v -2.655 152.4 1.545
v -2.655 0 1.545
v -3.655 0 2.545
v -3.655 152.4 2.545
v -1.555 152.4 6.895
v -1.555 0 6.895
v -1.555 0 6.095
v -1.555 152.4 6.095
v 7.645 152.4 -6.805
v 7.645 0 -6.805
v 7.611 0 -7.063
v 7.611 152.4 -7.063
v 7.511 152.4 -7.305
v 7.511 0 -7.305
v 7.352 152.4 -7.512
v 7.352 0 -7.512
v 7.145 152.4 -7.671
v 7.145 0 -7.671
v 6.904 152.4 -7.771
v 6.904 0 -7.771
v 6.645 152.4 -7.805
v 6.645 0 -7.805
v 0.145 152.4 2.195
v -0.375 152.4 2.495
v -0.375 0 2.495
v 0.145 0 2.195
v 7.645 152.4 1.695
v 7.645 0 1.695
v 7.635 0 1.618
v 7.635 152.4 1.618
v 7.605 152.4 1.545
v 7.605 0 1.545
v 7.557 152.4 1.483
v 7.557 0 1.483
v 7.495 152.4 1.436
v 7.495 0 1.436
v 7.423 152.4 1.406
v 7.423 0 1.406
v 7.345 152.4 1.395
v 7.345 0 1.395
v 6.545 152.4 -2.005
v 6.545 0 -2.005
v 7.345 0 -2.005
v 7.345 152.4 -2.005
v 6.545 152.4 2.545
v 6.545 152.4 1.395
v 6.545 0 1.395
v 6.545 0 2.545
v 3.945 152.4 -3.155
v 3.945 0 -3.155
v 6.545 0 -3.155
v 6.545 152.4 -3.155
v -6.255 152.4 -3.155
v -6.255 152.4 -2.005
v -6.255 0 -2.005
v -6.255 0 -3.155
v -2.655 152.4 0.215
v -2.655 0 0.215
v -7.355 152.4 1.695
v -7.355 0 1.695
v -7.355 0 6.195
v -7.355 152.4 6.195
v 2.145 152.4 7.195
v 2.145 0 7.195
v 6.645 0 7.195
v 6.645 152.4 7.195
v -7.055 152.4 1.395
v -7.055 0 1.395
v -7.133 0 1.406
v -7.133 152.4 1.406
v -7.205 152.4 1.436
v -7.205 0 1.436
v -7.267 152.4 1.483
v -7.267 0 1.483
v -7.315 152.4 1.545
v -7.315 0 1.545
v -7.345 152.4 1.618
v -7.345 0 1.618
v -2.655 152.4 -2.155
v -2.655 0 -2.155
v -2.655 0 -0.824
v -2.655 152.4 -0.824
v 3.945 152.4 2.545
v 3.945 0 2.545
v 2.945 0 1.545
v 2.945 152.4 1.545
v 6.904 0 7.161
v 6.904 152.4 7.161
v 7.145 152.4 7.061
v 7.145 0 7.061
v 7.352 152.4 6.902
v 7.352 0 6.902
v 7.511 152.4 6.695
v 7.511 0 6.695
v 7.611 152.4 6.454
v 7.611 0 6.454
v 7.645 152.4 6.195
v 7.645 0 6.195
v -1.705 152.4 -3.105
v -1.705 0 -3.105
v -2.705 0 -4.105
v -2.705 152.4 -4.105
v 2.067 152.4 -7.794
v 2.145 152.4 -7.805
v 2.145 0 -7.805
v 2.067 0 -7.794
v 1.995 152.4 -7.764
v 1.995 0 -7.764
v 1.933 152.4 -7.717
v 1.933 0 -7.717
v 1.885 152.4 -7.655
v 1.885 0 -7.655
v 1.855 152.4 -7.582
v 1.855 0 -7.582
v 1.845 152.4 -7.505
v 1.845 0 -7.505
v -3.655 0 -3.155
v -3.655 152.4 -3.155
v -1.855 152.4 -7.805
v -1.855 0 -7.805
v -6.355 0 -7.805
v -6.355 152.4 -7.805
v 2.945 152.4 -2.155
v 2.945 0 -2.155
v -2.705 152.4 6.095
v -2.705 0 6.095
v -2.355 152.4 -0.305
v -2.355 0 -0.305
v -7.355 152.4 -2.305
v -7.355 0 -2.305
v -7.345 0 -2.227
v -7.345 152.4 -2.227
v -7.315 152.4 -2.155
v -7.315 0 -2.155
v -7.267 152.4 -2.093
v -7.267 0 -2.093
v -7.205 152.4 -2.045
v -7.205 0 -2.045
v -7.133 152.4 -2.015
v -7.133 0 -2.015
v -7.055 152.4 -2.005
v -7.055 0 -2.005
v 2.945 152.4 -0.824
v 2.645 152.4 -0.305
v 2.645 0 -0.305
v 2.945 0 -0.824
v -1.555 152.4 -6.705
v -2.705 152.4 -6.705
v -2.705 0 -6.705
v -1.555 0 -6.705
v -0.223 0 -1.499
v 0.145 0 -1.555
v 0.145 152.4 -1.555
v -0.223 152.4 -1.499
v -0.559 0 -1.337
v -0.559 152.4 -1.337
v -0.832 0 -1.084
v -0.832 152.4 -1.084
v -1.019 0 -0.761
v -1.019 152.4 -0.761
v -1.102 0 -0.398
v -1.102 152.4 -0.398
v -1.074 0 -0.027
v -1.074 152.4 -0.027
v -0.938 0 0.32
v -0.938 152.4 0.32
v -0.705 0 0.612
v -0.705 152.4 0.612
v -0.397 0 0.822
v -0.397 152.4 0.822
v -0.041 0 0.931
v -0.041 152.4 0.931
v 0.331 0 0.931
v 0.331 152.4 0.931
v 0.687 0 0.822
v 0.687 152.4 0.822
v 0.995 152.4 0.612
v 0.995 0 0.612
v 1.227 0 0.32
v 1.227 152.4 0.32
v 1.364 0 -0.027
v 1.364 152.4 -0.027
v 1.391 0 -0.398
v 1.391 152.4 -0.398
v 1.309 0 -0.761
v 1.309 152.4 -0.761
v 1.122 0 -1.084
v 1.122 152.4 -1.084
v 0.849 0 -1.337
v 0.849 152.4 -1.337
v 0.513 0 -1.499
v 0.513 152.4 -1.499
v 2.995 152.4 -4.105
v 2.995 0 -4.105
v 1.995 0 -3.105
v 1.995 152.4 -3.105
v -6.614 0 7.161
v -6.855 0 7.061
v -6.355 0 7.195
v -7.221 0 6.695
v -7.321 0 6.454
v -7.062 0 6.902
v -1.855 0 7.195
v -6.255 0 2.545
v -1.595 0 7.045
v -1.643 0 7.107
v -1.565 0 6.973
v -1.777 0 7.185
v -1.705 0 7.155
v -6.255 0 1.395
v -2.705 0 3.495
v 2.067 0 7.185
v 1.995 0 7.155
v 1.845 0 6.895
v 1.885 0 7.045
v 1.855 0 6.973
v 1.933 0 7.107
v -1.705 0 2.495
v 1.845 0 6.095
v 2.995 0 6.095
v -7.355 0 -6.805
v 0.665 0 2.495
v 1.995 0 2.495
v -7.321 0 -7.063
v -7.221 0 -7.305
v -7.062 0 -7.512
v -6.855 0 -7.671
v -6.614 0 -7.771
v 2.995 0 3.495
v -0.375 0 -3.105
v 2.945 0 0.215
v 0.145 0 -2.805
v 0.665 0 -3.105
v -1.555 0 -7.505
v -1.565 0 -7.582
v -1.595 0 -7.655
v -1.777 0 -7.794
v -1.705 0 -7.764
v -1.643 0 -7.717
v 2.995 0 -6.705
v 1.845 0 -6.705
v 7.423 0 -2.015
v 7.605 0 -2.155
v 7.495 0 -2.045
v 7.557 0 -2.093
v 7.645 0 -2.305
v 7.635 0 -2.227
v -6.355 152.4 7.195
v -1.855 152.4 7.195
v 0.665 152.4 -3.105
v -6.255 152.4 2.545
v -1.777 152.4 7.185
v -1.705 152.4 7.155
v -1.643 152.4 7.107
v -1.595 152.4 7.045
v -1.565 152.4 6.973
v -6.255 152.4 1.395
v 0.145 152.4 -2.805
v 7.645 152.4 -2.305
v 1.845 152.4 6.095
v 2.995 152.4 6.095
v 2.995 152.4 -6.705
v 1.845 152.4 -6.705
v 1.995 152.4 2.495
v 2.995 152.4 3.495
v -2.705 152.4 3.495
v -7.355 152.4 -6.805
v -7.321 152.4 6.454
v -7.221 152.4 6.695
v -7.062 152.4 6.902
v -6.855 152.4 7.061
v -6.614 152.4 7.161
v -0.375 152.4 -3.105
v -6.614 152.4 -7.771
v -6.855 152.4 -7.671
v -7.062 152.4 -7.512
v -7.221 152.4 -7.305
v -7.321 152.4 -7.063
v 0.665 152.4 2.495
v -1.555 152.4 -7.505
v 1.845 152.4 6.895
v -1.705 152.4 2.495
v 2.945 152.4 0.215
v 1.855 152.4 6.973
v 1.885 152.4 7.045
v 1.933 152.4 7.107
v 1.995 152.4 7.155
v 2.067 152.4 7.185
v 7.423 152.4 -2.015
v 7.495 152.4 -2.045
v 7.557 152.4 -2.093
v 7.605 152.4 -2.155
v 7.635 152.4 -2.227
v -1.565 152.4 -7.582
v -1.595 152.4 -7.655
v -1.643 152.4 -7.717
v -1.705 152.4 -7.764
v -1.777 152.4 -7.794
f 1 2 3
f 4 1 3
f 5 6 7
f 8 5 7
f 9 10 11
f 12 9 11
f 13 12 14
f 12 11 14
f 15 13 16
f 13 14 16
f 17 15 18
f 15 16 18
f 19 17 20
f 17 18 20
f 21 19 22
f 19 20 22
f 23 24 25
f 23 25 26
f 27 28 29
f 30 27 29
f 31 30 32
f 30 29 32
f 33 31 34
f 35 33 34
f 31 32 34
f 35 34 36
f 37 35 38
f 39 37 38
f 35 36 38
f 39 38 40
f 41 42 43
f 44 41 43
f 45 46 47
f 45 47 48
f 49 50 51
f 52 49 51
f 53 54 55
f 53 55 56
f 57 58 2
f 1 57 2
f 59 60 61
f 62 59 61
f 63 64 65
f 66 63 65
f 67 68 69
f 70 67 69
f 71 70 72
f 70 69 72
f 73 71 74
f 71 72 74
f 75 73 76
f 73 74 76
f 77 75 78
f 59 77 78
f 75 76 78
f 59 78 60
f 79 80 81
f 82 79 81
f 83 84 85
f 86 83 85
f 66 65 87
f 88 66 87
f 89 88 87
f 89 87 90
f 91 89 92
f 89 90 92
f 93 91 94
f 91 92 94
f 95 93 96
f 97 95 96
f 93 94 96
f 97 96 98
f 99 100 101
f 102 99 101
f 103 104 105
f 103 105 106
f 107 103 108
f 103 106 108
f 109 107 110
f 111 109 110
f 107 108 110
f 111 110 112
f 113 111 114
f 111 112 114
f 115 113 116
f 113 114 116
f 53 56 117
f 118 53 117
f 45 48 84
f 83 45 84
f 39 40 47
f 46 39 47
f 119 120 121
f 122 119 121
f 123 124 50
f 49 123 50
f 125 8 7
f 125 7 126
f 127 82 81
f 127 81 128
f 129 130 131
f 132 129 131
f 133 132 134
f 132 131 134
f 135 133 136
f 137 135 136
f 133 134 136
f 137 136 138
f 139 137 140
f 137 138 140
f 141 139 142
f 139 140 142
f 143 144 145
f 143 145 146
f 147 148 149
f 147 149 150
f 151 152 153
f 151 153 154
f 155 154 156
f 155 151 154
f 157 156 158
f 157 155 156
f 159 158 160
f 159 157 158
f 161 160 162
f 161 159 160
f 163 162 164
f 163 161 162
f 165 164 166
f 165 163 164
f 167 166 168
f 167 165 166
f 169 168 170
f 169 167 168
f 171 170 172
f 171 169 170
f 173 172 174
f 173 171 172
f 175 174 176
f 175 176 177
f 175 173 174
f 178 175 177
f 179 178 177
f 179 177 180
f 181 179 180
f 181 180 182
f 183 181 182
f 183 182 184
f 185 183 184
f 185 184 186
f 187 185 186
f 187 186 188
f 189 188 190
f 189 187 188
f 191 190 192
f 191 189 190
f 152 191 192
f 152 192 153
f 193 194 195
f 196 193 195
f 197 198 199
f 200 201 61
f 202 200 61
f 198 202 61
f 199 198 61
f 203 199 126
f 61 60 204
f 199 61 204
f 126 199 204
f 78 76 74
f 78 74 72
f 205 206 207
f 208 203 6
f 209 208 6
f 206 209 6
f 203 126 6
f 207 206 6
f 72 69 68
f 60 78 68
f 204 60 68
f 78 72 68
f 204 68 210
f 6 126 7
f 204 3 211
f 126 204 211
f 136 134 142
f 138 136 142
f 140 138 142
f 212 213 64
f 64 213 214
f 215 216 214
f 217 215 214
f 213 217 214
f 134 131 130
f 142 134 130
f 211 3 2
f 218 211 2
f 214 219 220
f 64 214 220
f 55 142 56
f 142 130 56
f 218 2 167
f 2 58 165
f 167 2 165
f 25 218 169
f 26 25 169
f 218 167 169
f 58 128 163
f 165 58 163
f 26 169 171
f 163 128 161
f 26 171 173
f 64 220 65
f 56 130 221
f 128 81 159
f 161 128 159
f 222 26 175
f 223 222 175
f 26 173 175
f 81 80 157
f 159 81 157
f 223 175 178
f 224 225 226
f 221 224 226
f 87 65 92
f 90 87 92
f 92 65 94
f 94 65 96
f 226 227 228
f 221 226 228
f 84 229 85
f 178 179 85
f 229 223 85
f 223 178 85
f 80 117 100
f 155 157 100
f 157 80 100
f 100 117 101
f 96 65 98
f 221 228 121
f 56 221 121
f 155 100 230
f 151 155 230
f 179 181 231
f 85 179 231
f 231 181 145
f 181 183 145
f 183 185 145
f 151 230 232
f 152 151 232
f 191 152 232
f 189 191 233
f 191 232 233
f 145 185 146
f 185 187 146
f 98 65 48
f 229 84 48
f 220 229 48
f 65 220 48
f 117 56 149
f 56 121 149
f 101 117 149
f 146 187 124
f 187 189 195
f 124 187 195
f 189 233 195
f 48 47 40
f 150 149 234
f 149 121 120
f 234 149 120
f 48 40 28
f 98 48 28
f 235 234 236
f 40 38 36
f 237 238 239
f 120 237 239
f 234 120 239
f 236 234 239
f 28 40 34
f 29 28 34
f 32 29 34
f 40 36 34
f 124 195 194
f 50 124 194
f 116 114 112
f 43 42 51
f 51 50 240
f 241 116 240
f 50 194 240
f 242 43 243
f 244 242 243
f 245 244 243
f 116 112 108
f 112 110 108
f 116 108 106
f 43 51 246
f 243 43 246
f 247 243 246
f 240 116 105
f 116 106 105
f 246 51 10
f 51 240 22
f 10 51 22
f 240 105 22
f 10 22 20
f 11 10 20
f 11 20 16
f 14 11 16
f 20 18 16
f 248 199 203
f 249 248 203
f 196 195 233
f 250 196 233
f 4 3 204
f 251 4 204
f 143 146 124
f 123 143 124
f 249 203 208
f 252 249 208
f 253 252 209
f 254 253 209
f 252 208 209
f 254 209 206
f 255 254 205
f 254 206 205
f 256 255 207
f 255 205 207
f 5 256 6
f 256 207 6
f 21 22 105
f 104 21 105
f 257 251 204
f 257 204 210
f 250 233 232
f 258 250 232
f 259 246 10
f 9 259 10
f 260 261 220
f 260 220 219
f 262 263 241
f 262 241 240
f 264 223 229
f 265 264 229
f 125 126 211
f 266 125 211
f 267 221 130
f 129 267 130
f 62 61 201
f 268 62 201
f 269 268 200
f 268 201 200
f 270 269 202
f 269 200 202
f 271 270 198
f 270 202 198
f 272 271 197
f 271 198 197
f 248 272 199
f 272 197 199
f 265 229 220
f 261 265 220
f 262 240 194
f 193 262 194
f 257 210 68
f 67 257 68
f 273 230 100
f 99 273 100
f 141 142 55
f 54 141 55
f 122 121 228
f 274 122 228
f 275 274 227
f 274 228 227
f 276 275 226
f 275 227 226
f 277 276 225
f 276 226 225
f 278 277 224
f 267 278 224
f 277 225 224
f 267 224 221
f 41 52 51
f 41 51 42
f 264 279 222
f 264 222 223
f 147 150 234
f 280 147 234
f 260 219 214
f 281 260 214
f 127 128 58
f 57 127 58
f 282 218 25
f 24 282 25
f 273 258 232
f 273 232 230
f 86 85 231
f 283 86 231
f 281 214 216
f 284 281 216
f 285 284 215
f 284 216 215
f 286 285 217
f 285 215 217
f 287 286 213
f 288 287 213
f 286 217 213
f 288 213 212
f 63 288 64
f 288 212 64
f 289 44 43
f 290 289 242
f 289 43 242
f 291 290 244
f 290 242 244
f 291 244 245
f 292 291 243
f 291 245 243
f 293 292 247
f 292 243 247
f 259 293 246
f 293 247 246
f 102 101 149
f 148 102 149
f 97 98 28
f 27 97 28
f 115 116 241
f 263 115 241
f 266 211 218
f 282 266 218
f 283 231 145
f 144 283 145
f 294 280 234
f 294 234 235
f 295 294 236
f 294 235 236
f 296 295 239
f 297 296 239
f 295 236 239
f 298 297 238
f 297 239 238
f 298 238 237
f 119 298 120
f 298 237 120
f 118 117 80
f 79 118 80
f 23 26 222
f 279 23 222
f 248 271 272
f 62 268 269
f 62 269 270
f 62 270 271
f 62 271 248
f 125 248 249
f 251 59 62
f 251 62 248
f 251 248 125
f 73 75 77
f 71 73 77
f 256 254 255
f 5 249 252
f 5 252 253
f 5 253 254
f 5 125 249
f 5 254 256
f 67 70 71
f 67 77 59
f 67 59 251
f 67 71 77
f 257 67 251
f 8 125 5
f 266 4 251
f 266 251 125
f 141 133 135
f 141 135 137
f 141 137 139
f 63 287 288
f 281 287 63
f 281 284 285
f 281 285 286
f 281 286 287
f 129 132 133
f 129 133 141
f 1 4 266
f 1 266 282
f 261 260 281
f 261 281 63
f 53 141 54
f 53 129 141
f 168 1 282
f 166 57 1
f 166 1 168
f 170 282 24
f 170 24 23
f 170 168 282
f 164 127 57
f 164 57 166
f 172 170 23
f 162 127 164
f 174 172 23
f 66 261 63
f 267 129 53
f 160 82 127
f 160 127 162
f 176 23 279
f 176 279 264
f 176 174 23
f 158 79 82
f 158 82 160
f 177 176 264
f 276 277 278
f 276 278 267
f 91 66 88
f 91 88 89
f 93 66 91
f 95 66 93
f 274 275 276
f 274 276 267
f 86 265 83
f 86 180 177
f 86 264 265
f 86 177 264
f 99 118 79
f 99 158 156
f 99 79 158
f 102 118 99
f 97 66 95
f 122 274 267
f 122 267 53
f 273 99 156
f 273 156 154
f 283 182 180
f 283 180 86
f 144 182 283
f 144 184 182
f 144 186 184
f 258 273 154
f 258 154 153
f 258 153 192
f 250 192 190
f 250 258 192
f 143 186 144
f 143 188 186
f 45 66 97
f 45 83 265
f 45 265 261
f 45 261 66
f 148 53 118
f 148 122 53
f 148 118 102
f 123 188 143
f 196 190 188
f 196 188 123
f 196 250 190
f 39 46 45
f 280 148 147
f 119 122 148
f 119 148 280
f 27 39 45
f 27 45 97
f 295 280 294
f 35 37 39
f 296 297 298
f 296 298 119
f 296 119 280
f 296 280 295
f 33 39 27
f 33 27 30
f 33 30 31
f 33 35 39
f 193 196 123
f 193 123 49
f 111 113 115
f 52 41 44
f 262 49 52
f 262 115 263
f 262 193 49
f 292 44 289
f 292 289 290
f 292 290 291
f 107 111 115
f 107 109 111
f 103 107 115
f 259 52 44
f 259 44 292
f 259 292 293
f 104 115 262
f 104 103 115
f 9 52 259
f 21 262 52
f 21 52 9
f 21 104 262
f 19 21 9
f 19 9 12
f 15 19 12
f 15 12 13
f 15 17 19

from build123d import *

# Parameters (mm, degrees)
SKETCH1_R           = 1.25
BOSS_EXTRUDE1_DEPTH = 152.4


with BuildPart() as part:
    # Sketch1 → Boss-Extrude1 (new body)
    with BuildSketch(Plane(origin=(0, 0, 0), x_dir=(1, 0, 0), z_dir=(0, 1, 0))):
        with BuildLine():
            Line((-7.055036042, 2.004660127), (-6.255036042, 2.004660127))
            Line((-6.255036042, 2.004660127), (-6.255036042, 3.154660127))
            Line((-6.255036042, 3.154660127), (-3.655036042, 3.154660127))
            Line((-3.655036042, 3.154660127), (-2.655036042, 2.154660127))
            Line((-2.655036042, 2.154660127), (-2.655036042, 0.82427537))
            Line((-2.655036042, 0.82427537), (-2.355036042, 0.304660127))
            Line((-2.355036042, 0.304660127), (-2.655036042, -0.214955115))
            Line((-2.655036042, -0.214955115), (-2.655036042, -1.545339873))
            Line((-2.655036042, -1.545339873), (-3.655036042, -2.545339873))
            Line((-3.655036042, -2.545339873), (-6.255036042, -2.545339873))
            Line((-6.255036042, -2.545339873), (-6.255036042, -1.395339873))
            Line((-6.255036042, -1.395339873), (-7.055036042, -1.395339873))
            ThreePointArc((-7.055036042, -1.395339873), (-7.267168077, -1.483207838), (-7.355036042, -1.695339873))
            Line((-7.355036042, -1.695339873), (-7.355036042, -6.195339873))
            ThreePointArc((-7.355036042, -6.195339873), (-7.062142824, -6.902446654), (-6.355036042, -7.195339873))
            Line((-6.355036042, -7.195339873), (-1.855036042, -7.195339873))
            ThreePointArc((-1.855036042, -7.195339873), (-1.642904008, -7.107471907), (-1.555036042, -6.895339873))
            Line((-1.555036042, -6.895339873), (-1.555036042, -6.095339873))
            Line((-1.555036042, -6.095339873), (-2.705036042, -6.095339873))
            Line((-2.705036042, -6.095339873), (-2.705036042, -3.495339873))
            Line((-2.705036042, -3.495339873), (-1.705036042, -2.495339873))
            Line((-1.705036042, -2.495339873), (-0.374651285, -2.495339873))
            Line((-0.374651285, -2.495339873), (0.144963958, -2.195339873))
            Line((0.144963958, -2.195339873), (0.6645792, -2.495339873))
            Line((0.6645792, -2.495339873), (1.994963958, -2.495339873))
            Line((1.994963958, -2.495339873), (2.994963958, -3.495339873))
            Line((2.994963958, -3.495339873), (2.994963958, -6.095339873))
            Line((2.994963958, -6.095339873), (1.844963958, -6.095339873))
            Line((1.844963958, -6.095339873), (1.844963958, -6.895339873))
            ThreePointArc((1.844963958, -6.895339873), (1.932831923, -7.107471907), (2.144963958, -7.195339873))
            Line((2.144963958, -7.195339873), (6.644963958, -7.195339873))
            ThreePointArc((6.644963958, -7.195339873), (7.352070739, -6.902446654), (7.644963958, -6.195339873))
            Line((7.644963958, -6.195339873), (7.644963958, -1.695339873))
            ThreePointArc((7.644963958, -1.695339873), (7.557095992, -1.483207838), (7.344963958, -1.395339873))
            Line((7.344963958, -1.395339873), (6.544963958, -1.395339873))
            Line((6.544963958, -1.395339873), (6.544963958, -2.545339873))
            Line((6.544963958, -2.545339873), (3.944963958, -2.545339873))
            Line((3.944963958, -2.545339873), (2.944963958, -1.545339873))
            Line((2.944963958, -1.545339873), (2.944963958, -0.214955115))
            Line((2.944963958, -0.214955115), (2.644963958, 0.304660127))
            Line((2.644963958, 0.304660127), (2.944963958, 0.82427537))
            Line((2.944963958, 0.82427537), (2.944963958, 2.154660127))
            Line((2.944963958, 2.154660127), (3.944963958, 3.154660127))
            Line((3.944963958, 3.154660127), (6.544963958, 3.154660127))
            Line((6.544963958, 3.154660127), (6.544963958, 2.004660127))
            Line((6.544963958, 2.004660127), (7.344963958, 2.004660127))
            ThreePointArc((7.344963958, 2.004660127), (7.557095992, 2.092528093), (7.644963958, 2.304660127))
            Line((7.644963958, 2.304660127), (7.644963958, 6.804660127))
            ThreePointArc((7.644963958, 6.804660127), (7.352070739, 7.511766909), (6.644963958, 7.804660127))
            Line((6.644963958, 7.804660127), (2.144963958, 7.804660127))
            ThreePointArc((2.144963958, 7.804660127), (1.932831923, 7.716792162), (1.844963958, 7.504660127))
            Line((1.844963958, 7.504660127), (1.844963958, 6.704660127))
            Line((1.844963958, 6.704660127), (2.994963958, 6.704660127))
            Line((2.994963958, 6.704660127), (2.994963958, 4.104660127))
            Line((2.994963958, 4.104660127), (1.994963958, 3.104660127))
            Line((1.994963958, 3.104660127), (0.6645792, 3.104660127))
            Line((0.6645792, 3.104660127), (0.144963958, 2.804660127))
            Line((0.144963958, 2.804660127), (-0.374651285, 3.104660127))
            Line((-0.374651285, 3.104660127), (-1.705036042, 3.104660127))
            Line((-1.705036042, 3.104660127), (-2.705036042, 4.104660127))
            Line((-2.705036042, 4.104660127), (-2.705036042, 6.704660127))
            Line((-2.705036042, 6.704660127), (-1.555036042, 6.704660127))
            Line((-1.555036042, 6.704660127), (-1.555036042, 7.504660127))
            ThreePointArc((-1.555036042, 7.504660127), (-1.642904008, 7.716792162), (-1.855036042, 7.804660127))
            Line((-1.855036042, 7.804660127), (-6.355036042, 7.804660127))
            ThreePointArc((-6.355036042, 7.804660127), (-7.062142824, 7.511766909), (-7.355036042, 6.804660127))
            Line((-7.355036042, 6.804660127), (-7.355036042, 2.304660127))
            ThreePointArc((-7.355036042, 2.304660127), (-7.267168077, 2.092528093), (-7.055036042, 2.004660127))
        make_face()
        with Locations(Location((0.144963958, 0.304660127, 0), (0, 0, 90))):
            Circle(SKETCH1_R, mode=Mode.SUBTRACT)
    extrude(amount=BOSS_EXTRUDE1_DEPTH)


solid = part.part
